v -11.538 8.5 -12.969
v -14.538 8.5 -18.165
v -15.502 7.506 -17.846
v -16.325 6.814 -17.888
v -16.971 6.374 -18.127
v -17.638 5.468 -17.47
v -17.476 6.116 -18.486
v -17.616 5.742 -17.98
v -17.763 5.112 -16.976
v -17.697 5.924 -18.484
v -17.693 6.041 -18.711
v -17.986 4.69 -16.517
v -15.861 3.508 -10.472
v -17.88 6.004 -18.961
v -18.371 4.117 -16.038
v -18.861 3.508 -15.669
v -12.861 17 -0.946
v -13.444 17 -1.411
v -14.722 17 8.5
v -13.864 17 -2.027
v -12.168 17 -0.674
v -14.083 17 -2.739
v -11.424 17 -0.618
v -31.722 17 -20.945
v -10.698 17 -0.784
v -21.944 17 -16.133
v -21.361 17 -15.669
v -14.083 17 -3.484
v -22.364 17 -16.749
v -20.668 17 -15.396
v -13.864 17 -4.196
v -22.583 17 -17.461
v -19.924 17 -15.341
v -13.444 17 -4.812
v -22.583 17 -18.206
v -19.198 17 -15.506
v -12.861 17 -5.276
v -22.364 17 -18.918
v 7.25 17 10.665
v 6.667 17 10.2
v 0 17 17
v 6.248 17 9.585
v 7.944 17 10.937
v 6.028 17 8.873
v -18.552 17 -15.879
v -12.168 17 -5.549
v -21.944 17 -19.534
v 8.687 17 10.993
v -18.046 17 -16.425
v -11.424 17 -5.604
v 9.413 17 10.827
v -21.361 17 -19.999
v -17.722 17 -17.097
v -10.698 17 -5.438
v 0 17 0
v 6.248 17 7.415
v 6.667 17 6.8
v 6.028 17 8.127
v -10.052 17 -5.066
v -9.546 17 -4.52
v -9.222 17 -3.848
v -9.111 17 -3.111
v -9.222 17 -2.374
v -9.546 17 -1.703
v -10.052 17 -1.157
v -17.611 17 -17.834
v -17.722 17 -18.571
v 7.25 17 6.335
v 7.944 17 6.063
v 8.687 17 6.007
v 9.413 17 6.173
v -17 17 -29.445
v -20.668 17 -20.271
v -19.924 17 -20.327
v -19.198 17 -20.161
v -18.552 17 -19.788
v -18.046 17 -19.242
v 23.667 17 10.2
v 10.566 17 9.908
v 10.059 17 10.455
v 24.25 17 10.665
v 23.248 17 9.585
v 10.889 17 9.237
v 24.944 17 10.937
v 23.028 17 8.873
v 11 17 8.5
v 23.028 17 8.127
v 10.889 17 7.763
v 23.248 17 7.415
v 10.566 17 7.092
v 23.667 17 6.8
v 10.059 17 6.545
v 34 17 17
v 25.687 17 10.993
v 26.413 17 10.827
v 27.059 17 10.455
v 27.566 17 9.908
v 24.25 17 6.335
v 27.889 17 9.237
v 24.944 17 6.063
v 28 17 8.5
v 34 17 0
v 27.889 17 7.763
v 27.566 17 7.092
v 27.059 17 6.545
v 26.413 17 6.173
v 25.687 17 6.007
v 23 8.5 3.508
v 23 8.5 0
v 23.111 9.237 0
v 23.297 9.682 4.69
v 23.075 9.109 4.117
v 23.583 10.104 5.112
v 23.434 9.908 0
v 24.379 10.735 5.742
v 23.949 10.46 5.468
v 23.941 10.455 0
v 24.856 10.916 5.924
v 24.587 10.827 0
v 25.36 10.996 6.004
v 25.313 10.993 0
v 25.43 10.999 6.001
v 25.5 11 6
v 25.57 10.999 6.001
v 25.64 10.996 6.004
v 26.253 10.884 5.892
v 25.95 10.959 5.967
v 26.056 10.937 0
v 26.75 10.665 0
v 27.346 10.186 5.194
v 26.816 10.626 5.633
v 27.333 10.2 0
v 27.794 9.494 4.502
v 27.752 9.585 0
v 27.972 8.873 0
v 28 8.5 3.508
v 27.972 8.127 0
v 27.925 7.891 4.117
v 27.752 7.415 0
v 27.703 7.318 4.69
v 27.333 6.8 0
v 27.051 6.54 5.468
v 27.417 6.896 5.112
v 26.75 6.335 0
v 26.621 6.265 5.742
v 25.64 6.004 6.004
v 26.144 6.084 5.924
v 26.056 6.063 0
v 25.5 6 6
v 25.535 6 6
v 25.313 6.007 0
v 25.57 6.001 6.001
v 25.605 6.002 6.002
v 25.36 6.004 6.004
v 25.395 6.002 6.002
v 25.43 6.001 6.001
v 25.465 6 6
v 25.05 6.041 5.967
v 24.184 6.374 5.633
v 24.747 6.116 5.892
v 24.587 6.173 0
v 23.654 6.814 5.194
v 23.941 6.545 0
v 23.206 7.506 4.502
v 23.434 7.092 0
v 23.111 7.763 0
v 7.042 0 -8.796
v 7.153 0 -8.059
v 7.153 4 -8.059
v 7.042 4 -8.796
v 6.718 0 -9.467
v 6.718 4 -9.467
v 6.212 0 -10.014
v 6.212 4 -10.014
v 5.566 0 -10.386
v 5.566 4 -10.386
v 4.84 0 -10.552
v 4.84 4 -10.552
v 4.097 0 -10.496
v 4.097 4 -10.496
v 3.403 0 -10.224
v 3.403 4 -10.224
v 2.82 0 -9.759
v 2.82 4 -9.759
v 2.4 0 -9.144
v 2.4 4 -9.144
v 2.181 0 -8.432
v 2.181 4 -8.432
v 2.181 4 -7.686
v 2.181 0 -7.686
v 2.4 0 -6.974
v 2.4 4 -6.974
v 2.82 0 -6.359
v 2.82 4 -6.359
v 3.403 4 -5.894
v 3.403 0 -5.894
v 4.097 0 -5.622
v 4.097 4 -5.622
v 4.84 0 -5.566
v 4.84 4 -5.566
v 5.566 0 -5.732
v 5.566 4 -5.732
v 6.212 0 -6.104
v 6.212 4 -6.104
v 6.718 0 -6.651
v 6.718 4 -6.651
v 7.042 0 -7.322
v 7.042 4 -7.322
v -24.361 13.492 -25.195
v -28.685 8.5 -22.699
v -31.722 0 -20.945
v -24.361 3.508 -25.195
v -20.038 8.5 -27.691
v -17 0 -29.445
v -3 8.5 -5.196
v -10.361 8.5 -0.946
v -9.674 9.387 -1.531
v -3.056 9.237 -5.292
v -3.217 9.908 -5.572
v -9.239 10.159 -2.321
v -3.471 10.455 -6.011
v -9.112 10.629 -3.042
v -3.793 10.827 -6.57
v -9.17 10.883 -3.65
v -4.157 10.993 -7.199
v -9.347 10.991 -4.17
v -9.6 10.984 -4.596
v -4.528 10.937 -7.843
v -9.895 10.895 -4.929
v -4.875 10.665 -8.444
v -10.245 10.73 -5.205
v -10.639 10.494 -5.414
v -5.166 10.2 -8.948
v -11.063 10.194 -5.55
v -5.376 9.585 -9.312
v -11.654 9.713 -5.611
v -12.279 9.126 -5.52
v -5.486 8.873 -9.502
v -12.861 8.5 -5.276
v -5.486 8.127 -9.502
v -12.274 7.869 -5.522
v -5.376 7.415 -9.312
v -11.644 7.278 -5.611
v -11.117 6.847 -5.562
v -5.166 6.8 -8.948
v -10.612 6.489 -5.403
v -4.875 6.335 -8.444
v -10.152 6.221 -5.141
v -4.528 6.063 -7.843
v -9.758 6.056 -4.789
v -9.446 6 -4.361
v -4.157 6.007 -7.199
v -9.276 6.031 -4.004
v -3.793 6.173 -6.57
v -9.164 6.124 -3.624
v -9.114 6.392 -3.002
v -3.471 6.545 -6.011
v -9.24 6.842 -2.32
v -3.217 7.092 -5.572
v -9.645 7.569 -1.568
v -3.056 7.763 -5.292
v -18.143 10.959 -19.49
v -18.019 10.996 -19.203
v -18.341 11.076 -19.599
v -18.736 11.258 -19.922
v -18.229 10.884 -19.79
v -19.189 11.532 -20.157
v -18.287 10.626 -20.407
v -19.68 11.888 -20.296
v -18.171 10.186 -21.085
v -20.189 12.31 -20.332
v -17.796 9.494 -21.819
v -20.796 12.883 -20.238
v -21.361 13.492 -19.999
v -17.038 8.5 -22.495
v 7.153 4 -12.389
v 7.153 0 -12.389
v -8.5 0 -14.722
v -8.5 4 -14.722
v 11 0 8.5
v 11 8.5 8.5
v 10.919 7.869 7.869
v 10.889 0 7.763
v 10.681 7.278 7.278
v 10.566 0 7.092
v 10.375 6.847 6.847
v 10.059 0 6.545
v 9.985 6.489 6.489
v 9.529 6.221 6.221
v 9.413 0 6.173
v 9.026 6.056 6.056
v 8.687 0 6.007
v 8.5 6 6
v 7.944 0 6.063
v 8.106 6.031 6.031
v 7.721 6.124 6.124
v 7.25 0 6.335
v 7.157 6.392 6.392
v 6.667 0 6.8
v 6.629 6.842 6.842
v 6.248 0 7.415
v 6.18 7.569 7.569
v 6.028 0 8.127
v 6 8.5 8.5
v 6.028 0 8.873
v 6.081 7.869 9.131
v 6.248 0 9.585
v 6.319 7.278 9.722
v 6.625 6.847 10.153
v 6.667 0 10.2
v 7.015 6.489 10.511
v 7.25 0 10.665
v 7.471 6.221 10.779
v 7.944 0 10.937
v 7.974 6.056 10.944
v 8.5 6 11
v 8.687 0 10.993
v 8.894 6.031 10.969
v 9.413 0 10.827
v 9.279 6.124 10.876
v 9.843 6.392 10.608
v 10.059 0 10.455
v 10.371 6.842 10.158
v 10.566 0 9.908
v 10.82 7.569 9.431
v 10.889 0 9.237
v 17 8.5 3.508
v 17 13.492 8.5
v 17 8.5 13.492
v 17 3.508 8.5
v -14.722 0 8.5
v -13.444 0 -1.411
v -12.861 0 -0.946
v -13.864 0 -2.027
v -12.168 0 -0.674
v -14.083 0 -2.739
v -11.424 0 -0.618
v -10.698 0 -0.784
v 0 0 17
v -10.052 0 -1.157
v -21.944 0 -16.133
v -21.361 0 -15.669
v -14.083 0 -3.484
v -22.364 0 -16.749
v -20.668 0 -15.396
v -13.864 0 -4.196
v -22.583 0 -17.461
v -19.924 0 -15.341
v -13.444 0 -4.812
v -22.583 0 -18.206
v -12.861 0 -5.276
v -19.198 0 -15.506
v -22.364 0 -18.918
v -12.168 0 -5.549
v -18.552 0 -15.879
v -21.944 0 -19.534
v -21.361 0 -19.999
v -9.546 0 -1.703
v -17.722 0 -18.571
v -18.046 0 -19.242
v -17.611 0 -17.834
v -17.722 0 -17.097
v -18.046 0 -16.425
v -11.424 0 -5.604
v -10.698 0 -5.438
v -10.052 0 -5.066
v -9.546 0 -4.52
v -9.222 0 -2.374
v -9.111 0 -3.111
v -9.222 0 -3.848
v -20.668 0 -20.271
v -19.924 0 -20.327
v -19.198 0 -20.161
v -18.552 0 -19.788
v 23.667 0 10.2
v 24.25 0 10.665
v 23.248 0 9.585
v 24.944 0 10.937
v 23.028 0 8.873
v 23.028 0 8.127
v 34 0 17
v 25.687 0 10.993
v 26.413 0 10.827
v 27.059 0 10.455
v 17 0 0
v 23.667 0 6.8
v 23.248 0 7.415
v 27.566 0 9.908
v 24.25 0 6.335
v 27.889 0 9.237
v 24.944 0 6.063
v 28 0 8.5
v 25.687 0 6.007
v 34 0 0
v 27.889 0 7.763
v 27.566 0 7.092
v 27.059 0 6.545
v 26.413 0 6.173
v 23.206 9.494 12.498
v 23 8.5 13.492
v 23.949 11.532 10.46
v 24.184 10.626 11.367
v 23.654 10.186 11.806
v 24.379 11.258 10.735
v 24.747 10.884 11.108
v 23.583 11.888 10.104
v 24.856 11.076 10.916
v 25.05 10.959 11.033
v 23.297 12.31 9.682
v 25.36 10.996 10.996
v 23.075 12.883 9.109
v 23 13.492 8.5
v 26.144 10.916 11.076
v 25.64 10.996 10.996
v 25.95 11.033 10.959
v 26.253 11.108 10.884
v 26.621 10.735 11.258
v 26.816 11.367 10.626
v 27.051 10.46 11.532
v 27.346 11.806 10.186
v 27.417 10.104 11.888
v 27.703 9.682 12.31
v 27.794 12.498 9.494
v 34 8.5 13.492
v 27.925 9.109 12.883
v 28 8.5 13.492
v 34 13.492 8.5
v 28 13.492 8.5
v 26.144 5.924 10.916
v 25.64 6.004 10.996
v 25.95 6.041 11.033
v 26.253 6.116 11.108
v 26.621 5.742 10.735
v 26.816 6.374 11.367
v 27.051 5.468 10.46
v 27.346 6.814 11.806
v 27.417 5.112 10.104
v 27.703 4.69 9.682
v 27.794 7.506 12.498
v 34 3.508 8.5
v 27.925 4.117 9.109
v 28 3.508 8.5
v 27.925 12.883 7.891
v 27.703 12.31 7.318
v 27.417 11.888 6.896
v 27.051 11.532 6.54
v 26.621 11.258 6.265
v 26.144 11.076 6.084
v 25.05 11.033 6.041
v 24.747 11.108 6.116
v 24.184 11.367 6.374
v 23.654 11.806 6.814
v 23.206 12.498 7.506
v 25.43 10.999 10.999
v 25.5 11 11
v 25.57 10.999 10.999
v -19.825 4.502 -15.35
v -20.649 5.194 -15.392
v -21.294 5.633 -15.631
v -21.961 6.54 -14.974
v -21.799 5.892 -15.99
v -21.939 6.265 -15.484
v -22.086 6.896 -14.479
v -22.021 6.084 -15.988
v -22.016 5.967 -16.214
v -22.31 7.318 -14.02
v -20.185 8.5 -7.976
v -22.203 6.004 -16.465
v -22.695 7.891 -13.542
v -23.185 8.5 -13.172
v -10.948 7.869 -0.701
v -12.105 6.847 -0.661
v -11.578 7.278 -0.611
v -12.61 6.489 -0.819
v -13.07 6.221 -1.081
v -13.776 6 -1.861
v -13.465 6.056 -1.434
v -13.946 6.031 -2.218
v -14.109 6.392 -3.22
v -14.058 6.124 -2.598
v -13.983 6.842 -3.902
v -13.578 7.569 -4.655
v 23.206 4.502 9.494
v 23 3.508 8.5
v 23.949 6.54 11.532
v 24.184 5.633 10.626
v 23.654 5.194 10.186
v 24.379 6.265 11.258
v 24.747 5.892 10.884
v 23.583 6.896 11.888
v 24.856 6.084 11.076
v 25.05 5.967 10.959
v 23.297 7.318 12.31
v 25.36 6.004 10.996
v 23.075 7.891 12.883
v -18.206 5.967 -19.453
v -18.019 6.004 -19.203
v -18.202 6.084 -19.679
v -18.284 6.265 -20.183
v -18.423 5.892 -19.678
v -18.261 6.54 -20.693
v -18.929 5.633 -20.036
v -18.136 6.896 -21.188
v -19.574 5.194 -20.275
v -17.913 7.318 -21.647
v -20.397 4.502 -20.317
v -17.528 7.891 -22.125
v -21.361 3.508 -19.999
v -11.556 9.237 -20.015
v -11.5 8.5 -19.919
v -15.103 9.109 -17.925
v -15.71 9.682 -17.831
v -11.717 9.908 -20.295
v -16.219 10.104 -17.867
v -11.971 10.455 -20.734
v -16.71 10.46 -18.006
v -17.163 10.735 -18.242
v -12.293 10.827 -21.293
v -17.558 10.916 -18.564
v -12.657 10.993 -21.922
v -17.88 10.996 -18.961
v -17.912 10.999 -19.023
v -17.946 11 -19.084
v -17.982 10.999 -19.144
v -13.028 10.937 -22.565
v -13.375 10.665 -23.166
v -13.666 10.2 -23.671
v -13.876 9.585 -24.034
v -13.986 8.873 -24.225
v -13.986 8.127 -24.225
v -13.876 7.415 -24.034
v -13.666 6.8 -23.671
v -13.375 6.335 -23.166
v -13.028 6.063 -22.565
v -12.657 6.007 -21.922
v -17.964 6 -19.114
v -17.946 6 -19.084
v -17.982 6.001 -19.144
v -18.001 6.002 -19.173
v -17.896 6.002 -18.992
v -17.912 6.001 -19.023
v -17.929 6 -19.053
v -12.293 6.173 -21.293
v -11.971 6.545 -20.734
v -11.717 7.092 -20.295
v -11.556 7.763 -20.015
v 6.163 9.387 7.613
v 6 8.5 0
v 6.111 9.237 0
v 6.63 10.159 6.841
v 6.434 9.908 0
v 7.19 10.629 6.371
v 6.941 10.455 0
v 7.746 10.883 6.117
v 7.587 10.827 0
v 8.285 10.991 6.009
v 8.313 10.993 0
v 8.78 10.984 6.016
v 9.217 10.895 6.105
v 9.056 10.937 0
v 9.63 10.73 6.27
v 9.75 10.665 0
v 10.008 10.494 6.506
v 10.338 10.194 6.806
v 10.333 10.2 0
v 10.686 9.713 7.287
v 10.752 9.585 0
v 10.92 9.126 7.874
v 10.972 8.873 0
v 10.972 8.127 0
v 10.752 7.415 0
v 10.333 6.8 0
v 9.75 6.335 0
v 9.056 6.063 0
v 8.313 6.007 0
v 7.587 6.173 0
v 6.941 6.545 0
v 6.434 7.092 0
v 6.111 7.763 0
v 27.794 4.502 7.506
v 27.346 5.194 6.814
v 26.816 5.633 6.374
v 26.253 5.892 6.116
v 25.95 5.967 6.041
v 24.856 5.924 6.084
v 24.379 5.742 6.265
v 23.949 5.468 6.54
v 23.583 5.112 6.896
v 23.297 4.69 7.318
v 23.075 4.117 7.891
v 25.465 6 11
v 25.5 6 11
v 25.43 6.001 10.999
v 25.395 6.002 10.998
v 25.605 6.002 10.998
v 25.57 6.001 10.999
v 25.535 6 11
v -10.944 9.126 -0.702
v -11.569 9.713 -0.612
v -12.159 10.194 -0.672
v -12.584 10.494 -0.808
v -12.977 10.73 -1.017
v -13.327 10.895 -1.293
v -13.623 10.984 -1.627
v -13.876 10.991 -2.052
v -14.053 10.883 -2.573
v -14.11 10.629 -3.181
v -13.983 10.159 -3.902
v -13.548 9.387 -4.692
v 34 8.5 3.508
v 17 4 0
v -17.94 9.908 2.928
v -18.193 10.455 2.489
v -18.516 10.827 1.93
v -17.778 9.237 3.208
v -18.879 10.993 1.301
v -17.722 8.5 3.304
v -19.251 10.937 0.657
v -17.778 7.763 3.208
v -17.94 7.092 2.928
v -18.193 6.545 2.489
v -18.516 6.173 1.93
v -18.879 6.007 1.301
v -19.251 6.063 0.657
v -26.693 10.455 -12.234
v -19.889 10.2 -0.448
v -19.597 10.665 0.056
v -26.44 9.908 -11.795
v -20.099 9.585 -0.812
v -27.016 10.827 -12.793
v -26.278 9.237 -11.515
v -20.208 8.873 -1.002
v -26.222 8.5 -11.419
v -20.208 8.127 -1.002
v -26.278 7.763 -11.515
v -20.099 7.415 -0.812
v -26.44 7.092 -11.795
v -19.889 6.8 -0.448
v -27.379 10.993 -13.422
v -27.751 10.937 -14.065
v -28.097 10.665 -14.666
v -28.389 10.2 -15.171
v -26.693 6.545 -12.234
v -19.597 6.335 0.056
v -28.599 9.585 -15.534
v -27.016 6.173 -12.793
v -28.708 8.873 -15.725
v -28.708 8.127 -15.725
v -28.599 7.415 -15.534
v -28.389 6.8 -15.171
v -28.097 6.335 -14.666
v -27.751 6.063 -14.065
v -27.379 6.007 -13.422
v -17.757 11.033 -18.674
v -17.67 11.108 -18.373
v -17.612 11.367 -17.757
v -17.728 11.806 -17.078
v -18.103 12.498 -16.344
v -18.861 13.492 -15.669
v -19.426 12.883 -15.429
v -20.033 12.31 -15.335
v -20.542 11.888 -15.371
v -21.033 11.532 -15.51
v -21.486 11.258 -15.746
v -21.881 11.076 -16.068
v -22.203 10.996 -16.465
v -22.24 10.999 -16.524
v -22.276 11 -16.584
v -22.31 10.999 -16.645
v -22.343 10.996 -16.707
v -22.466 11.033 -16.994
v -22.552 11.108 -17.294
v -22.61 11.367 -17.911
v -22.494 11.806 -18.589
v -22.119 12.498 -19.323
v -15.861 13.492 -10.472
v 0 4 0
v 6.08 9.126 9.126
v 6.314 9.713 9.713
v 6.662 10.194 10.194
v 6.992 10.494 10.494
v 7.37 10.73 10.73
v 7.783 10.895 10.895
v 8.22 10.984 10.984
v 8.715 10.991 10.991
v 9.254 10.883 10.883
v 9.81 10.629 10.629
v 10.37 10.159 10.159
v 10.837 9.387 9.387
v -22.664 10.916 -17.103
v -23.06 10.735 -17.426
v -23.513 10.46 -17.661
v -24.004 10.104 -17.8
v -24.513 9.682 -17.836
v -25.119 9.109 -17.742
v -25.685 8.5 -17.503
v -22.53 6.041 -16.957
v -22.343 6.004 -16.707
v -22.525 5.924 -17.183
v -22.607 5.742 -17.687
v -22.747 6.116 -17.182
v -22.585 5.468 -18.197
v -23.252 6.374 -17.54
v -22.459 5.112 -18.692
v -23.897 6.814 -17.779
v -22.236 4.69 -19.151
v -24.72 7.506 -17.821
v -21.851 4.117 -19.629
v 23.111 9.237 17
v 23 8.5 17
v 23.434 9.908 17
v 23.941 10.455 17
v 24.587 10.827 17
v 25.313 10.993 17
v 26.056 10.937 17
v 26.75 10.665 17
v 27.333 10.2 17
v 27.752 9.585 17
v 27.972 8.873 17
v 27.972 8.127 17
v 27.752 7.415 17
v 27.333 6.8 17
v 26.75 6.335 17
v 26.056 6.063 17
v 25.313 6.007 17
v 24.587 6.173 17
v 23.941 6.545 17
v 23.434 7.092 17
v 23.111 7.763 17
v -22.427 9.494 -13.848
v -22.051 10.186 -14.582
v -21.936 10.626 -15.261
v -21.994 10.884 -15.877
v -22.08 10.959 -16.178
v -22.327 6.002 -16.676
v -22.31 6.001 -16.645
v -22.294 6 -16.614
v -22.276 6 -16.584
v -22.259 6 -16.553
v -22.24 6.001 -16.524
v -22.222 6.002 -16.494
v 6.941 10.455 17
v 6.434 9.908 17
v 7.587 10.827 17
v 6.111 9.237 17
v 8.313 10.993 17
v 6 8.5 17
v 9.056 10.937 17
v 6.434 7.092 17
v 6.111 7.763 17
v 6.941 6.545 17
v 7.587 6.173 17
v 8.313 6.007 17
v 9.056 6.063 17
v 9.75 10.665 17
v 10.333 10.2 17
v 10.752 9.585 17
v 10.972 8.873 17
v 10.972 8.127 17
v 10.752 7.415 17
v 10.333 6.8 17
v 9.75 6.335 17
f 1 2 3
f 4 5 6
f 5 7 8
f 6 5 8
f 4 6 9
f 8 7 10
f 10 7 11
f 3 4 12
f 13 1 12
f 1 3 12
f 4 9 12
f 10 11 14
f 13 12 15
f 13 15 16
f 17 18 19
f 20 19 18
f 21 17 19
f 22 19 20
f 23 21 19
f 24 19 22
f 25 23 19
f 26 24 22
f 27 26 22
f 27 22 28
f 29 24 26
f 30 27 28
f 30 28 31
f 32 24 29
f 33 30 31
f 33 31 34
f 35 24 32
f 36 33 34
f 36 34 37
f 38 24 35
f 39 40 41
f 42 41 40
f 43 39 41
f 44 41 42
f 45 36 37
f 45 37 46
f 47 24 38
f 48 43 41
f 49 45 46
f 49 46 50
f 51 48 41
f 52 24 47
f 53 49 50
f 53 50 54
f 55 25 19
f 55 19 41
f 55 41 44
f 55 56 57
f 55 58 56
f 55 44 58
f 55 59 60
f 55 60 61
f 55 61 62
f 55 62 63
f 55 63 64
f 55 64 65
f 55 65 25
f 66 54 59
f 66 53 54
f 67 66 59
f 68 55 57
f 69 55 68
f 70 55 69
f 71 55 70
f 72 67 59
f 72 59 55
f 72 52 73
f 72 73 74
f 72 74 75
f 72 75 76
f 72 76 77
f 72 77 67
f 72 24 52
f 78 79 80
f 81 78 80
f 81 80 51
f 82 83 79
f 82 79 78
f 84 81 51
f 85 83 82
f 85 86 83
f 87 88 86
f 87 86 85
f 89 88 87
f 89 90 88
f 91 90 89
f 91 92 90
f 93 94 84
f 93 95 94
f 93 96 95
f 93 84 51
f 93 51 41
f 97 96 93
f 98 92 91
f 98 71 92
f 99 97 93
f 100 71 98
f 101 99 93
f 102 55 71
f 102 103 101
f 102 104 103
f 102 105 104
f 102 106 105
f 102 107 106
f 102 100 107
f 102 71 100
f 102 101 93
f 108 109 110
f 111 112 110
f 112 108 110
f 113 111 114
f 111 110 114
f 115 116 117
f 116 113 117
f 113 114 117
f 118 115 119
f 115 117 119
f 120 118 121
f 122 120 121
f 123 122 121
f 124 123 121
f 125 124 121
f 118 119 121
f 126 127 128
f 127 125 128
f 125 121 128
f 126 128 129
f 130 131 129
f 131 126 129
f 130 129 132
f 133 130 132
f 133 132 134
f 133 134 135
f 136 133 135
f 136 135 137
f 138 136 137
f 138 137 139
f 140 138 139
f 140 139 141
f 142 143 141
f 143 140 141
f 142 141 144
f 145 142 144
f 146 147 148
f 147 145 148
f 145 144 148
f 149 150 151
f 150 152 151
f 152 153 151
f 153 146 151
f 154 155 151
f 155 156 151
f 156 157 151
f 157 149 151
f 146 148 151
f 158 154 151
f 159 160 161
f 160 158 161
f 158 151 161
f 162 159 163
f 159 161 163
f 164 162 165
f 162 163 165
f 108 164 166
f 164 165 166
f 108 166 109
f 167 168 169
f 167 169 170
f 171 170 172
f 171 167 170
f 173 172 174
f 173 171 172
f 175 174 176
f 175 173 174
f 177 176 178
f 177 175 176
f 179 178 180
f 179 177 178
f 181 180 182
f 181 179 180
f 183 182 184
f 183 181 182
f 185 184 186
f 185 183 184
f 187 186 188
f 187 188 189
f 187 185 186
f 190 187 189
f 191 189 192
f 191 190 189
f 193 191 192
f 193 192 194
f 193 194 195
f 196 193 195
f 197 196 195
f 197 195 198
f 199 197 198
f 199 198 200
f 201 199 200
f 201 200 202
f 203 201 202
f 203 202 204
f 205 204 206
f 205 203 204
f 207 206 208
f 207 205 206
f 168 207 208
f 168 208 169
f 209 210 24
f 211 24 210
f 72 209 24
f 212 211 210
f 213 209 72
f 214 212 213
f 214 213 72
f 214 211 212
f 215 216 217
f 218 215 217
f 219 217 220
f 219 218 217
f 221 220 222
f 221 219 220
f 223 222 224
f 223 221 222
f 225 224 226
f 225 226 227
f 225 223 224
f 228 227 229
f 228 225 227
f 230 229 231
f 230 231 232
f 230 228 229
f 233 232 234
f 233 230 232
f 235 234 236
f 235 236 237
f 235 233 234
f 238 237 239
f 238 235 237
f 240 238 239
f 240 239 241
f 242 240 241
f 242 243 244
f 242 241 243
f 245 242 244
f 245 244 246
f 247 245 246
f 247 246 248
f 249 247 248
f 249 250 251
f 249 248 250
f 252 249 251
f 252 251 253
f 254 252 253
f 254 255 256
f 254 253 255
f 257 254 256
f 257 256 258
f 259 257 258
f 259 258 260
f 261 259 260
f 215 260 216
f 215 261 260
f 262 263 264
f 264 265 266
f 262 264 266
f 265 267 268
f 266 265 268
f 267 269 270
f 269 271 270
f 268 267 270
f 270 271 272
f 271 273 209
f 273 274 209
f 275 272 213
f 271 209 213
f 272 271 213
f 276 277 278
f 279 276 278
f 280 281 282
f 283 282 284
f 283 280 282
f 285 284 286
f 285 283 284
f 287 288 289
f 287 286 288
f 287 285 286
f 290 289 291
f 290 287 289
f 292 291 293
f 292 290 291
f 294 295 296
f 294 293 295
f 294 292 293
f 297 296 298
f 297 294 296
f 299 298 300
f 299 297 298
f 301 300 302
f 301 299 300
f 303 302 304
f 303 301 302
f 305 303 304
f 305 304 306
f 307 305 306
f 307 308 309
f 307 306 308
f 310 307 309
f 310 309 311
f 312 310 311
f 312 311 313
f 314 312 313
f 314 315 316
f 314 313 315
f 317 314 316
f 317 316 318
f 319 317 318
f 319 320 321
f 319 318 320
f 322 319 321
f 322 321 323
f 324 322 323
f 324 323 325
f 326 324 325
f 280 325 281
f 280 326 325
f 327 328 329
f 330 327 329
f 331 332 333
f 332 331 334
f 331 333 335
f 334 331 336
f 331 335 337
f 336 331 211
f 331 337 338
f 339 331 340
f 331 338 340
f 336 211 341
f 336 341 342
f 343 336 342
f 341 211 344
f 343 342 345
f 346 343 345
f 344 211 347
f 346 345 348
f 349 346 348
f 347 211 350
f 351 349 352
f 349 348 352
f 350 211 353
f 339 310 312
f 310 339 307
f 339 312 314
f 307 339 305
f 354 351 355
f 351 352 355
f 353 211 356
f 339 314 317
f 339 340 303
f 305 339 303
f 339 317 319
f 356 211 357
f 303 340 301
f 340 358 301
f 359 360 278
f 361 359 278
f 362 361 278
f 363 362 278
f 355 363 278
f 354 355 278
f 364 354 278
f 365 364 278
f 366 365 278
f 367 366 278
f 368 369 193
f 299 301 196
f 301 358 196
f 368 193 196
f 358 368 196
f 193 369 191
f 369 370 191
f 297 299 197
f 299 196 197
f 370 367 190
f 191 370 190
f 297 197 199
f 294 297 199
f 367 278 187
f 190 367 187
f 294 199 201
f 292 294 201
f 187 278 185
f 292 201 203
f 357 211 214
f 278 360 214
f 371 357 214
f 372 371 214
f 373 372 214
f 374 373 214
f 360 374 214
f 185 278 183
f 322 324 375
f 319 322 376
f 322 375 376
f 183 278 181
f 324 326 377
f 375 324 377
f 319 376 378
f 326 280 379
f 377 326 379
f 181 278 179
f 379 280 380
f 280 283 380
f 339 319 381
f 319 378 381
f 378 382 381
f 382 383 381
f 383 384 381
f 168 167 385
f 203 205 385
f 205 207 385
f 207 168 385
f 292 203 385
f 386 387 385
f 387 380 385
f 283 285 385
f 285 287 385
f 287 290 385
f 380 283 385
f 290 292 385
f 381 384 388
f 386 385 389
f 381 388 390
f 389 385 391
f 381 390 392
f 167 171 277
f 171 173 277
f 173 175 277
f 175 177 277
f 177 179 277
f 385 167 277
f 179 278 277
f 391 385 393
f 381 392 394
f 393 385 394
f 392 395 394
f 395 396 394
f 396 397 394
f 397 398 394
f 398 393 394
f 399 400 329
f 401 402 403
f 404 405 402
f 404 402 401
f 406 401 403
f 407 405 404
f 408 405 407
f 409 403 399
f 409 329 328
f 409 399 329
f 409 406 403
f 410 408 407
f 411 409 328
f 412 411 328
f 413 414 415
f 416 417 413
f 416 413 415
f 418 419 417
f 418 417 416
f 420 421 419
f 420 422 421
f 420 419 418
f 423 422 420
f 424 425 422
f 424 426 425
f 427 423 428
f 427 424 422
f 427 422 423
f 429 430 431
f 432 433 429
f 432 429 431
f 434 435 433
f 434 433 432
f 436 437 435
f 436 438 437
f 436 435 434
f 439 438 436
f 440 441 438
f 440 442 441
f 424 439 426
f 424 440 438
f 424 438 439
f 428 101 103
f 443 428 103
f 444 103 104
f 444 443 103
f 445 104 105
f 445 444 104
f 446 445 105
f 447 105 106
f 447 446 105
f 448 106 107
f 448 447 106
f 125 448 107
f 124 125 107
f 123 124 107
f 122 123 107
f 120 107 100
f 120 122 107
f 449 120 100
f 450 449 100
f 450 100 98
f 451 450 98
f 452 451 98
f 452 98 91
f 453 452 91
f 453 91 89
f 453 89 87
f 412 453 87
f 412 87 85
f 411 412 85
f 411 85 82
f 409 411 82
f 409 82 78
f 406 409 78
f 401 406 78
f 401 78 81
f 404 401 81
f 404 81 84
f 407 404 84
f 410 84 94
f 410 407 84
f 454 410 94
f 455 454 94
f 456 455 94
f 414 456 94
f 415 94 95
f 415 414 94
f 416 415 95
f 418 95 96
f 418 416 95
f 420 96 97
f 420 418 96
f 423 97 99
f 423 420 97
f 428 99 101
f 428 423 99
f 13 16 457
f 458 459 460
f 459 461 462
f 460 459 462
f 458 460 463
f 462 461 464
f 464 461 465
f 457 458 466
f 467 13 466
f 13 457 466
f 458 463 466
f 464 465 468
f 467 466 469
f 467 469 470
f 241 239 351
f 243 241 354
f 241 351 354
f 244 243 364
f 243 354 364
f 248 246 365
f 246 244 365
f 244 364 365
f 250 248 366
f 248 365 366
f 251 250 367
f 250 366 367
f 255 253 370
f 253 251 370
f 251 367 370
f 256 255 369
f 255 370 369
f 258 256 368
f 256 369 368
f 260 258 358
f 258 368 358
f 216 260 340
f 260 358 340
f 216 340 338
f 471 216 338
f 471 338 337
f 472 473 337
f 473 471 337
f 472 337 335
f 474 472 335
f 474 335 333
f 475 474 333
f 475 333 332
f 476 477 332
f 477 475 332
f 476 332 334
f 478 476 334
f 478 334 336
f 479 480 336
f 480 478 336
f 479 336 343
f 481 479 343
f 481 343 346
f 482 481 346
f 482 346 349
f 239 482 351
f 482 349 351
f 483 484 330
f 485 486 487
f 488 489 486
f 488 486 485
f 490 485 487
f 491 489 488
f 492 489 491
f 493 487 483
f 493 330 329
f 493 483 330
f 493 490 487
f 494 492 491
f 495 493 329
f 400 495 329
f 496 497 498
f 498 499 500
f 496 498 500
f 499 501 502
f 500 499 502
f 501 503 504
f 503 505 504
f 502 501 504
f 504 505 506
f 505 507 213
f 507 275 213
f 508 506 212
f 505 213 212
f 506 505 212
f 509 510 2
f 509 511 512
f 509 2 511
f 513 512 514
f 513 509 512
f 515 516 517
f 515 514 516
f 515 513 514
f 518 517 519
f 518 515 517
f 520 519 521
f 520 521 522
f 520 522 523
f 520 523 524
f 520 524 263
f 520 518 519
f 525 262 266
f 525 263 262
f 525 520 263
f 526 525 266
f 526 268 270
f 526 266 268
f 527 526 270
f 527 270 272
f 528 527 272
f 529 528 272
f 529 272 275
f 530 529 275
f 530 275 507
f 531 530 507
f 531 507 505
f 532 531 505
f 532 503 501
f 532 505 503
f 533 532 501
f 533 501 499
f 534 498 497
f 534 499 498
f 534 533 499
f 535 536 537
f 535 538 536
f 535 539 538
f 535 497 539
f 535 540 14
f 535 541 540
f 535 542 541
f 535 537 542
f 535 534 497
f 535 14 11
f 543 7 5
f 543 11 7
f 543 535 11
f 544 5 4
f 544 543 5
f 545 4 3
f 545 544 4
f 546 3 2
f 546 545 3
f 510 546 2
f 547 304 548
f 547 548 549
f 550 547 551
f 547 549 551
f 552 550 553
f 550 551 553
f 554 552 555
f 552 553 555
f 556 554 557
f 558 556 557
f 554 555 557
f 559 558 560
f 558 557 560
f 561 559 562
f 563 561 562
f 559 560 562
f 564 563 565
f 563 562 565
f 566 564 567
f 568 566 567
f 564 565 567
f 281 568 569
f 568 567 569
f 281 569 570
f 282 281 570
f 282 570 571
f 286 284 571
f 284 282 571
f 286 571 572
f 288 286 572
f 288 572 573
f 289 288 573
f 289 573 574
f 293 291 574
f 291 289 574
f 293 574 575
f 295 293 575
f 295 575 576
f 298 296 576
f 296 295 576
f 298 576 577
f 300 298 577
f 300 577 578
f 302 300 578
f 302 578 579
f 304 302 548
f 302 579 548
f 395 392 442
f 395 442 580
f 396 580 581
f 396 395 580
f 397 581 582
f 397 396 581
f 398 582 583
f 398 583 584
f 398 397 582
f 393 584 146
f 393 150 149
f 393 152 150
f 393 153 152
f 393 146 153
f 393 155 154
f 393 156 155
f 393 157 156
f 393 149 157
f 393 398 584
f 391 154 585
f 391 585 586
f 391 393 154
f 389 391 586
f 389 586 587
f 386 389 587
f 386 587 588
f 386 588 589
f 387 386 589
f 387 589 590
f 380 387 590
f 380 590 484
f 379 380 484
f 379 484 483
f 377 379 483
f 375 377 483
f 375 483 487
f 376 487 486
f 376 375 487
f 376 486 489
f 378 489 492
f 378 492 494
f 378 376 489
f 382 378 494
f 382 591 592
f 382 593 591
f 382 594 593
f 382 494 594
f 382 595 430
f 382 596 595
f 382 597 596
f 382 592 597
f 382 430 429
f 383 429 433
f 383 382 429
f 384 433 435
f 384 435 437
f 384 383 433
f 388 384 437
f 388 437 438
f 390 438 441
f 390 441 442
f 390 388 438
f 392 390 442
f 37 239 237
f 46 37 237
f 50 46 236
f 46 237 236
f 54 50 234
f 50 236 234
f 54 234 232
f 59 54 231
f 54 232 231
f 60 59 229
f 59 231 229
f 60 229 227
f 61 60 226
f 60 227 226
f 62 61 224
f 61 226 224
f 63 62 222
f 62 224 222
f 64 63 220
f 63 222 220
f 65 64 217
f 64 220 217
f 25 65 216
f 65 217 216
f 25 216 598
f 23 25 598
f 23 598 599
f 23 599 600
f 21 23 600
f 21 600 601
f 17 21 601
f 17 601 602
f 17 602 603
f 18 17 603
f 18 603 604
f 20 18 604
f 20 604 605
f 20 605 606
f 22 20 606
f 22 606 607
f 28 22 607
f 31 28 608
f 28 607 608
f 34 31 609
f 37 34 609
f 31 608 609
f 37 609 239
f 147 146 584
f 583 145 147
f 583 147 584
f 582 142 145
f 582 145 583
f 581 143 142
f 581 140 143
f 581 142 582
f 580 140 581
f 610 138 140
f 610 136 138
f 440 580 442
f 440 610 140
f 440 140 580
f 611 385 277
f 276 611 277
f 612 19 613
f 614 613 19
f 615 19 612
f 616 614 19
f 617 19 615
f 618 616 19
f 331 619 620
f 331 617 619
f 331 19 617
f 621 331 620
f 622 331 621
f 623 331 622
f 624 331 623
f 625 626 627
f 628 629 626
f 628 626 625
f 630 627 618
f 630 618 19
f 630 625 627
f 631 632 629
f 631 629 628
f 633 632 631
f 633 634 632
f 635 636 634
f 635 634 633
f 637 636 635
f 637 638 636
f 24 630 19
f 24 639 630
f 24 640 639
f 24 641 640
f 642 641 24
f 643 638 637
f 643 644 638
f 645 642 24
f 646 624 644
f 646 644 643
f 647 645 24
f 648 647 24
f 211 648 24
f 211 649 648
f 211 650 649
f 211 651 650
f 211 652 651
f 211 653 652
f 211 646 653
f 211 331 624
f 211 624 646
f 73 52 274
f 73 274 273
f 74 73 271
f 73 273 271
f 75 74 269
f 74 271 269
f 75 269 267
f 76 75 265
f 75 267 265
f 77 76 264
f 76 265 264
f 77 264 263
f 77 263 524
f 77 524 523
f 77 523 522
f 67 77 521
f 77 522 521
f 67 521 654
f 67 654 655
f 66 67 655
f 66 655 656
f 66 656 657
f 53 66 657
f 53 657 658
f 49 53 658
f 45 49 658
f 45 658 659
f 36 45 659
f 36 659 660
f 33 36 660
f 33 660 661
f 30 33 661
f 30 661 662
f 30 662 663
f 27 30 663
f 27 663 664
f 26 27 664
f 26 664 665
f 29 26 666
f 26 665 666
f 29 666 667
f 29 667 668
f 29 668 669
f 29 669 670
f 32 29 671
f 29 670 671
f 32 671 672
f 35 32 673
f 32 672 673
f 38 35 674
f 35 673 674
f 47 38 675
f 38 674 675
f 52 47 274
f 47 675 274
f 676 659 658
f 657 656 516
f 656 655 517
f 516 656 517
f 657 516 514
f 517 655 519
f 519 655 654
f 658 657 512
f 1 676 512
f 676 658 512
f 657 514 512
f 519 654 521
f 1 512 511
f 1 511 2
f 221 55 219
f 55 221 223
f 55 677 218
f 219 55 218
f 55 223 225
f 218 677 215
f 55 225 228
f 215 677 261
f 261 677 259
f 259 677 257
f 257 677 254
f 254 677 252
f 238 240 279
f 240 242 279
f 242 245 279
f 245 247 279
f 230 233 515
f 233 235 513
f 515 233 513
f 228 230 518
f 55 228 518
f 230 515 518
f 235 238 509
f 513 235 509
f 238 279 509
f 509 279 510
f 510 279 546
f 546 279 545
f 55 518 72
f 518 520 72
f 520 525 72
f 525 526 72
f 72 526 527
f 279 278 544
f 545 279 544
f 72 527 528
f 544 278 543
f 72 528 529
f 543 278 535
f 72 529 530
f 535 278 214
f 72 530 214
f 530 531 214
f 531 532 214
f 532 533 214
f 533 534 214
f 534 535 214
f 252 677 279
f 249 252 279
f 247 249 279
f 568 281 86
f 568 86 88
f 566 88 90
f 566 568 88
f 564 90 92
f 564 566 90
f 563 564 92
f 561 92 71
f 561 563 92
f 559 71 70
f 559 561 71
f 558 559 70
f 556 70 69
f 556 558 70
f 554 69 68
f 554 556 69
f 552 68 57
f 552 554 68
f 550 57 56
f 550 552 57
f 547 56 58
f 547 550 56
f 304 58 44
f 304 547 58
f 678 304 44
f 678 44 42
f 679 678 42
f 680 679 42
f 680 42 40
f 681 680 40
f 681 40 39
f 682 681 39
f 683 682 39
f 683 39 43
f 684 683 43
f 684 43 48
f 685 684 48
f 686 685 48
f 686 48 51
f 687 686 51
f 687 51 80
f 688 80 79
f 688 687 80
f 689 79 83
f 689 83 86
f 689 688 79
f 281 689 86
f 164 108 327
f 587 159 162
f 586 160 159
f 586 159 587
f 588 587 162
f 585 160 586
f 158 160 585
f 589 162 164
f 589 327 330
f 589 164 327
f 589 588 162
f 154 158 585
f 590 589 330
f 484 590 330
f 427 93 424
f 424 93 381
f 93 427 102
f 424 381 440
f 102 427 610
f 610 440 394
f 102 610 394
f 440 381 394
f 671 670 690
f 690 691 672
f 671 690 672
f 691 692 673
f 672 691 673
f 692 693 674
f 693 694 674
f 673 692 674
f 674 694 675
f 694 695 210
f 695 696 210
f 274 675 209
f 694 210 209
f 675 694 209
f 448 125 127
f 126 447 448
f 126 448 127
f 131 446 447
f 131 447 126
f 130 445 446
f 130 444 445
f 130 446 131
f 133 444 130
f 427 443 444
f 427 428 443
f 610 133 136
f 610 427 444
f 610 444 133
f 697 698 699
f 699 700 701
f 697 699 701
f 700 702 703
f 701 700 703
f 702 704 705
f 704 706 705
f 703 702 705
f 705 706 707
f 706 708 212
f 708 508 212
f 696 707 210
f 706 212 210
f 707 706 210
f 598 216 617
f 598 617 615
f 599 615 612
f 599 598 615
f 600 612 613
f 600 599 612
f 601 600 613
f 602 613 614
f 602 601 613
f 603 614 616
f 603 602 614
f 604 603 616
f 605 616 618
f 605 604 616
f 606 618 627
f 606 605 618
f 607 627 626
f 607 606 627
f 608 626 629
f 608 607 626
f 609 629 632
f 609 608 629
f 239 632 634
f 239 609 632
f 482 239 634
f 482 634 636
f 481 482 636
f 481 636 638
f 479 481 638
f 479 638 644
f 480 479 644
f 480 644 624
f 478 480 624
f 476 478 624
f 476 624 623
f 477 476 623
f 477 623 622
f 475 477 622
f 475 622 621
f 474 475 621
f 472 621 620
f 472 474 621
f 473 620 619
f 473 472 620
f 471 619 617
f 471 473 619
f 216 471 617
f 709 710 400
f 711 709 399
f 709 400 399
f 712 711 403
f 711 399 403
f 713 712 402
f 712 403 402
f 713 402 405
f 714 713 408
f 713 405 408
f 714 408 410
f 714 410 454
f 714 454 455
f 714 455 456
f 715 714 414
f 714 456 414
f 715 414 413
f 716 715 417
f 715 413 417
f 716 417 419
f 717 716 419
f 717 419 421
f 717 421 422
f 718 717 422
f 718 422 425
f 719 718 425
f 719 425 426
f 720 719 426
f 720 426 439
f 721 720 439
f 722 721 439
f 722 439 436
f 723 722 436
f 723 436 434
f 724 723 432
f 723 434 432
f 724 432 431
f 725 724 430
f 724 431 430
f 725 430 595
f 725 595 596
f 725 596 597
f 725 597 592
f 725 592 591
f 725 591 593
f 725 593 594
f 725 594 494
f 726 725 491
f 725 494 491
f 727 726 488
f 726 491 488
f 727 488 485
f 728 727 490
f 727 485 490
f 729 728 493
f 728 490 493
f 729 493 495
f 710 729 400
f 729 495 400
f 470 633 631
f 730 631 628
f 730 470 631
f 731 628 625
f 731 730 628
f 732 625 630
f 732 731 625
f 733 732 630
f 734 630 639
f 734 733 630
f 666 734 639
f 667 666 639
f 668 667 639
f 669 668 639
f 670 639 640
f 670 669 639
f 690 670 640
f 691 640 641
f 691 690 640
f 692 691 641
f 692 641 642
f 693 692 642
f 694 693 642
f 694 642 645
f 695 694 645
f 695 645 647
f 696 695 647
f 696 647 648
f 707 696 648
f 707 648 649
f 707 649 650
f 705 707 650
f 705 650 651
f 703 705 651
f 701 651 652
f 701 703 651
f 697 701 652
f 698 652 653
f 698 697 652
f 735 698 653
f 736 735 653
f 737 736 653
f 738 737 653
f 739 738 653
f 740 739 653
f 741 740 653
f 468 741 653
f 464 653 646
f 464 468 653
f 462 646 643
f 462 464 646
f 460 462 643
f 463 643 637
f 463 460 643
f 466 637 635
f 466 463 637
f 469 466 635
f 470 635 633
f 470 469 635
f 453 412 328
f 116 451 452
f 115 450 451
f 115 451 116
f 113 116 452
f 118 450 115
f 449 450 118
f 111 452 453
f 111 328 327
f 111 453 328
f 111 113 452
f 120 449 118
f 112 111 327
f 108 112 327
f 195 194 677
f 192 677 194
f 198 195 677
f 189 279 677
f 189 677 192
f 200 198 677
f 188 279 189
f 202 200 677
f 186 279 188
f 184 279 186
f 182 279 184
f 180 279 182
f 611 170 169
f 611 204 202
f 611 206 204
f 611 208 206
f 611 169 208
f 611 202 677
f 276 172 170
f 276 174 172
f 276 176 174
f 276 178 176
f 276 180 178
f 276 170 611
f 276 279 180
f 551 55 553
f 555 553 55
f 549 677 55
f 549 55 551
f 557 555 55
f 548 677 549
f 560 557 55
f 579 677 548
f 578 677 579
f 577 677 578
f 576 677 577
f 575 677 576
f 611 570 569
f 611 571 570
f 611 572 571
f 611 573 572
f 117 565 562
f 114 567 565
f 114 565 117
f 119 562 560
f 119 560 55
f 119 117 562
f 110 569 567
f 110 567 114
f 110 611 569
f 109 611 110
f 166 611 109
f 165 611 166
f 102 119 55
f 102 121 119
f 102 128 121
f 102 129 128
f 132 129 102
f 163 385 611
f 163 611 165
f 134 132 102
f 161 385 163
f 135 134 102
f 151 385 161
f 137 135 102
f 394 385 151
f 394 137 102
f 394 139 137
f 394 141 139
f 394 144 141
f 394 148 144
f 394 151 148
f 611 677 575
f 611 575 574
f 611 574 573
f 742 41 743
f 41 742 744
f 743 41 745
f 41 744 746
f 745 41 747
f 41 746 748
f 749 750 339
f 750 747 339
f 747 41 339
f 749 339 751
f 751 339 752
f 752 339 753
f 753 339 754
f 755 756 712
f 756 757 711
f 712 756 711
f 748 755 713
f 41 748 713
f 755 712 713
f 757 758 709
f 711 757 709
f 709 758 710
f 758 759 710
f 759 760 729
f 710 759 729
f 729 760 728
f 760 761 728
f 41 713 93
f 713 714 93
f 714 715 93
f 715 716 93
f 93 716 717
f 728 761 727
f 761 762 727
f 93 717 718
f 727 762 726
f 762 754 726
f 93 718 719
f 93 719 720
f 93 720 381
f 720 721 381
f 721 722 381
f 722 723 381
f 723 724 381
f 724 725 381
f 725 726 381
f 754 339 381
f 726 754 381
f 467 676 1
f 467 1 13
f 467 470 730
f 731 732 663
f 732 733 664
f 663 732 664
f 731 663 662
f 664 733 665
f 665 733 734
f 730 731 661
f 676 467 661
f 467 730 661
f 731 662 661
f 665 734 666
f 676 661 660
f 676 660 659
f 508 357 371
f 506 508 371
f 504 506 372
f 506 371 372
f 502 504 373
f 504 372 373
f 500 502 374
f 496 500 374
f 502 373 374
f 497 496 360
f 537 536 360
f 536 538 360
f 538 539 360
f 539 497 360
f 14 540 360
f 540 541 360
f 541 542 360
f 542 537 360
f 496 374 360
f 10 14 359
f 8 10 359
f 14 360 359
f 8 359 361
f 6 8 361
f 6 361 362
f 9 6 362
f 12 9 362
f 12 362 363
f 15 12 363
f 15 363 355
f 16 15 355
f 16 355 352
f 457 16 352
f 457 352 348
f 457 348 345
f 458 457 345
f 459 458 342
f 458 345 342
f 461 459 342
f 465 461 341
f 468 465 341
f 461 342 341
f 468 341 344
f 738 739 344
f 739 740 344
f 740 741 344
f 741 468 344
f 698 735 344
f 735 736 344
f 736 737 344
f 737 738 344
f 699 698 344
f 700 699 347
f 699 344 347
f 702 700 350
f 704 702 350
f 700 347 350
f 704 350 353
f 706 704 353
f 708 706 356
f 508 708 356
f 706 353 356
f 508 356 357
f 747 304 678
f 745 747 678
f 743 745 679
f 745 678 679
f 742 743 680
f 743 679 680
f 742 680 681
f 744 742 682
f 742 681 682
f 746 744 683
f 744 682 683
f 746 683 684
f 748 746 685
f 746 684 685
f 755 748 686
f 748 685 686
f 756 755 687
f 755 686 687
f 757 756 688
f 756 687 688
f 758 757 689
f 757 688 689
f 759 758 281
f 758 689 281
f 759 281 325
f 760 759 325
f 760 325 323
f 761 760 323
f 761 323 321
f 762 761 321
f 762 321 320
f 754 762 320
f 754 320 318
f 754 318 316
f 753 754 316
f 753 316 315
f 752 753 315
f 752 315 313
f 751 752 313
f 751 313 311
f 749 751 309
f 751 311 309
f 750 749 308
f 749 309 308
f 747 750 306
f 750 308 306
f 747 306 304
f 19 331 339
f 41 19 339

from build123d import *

# Parameters (mm, degrees)
SKETCH1_W           = 34
SKETCH1_H           = 17
SKETCH1_R           = 2.5
BOSS_EXTRUDE1_DEPTH = 17
SKETCH6_OUTSIDE_W   = 44.328
SKETCH6_OUTSIDE_H   = 27.328
SKETCH6_OUTSIDE_W_2 = 34
SKETCH6_OUTSIDE_H_2 = 17
SKETCH6_OUTSIDE_R   = 2.5
CUT_EXTRUDE10_DEPTH = 18
SKETCH7_OUTSIDE_W   = 27.328
SKETCH7_OUTSIDE_H   = 27.328
SKETCH7_OUTSIDE_W_2 = 17
SKETCH7_OUTSIDE_H_2 = 17
CUT_EXTRUDE11_DEPTH = 17
BOSS_EXTRUDE2_DEPTH = 17
SKETCH13_R          = 2.5
BOSS_EXTRUDE3_DEPTH = 4


with BuildPart() as part:
    # sketch1 → Boss-Extrude1 (new body)
    with BuildSketch(Plane(origin=(0, 0, 0), x_dir=(1, 0, 0), z_dir=(0, 1, 0))):
        with Locations((17, -8.5)):
            Rectangle(SKETCH1_W, SKETCH1_H)
        with Locations((8.5, -8.5)):
            Circle(SKETCH1_R, mode=Mode.SUBTRACT)
        with Locations((25.5, -8.5)):
            Circle(SKETCH1_R, mode=Mode.SUBTRACT)
    extrude(amount=BOSS_EXTRUDE1_DEPTH)

    # Sketch6 outside → Cut-Extrude10 (cut, through all)
    with BuildSketch(Plane(origin=(0, 0, 0), x_dir=(-1, 0, 0), z_dir=(0, 0, -1))):
        with Locations((-17, 8.5)):
            Rectangle(SKETCH6_OUTSIDE_W, SKETCH6_OUTSIDE_H)
        with Locations((-17, 8.5)):
            Rectangle(SKETCH6_OUTSIDE_W_2, SKETCH6_OUTSIDE_H_2, mode=Mode.SUBTRACT)
        with Locations((-25.5, 8.5)):
            Circle(SKETCH6_OUTSIDE_R)
        with Locations((-8.5, 8.5)):
            Circle(SKETCH6_OUTSIDE_R)
    extrude(amount=-CUT_EXTRUDE10_DEPTH, mode=Mode.SUBTRACT)

    # Sketch7 outside → Cut-Extrude11 (cut)
    with BuildSketch(Plane(origin=(34, 0, 0), x_dir=(0, 0, -1), z_dir=(1, 0, 0))):
        with Locations((-8.5, 8.5)):
            Rectangle(SKETCH7_OUTSIDE_W, SKETCH7_OUTSIDE_H)
        with Locations((-8.5, 8.5)):
            Rectangle(SKETCH7_OUTSIDE_W_2, SKETCH7_OUTSIDE_H_2, mode=Mode.SUBTRACT)
        Polygon((-8.5, 13.492173875), (-3.507826125, 8.5), (-8.5, 3.507826125), (-13.492173875, 8.5), align=None)
    extrude(amount=-CUT_EXTRUDE11_DEPTH, mode=Mode.SUBTRACT)


with BuildPart() as body_2:
    # Mirror6: mirrored copy
    add(part.part.mirror(Plane(origin=(0, 0, 0), x_dir=(-0.5, 0, 0.866025404), z_dir=(-0.866025404, 0, -0.5))))


with BuildPart() as part_1:
    add(part.part)

    add(body_2.part)  # Boss-Extrude2 merges body 2
    # Sketch11 → Boss-Extrude2 (add)
    with BuildSketch(Plane(origin=(0, 0, 0), x_dir=(1, 0, 0), z_dir=(0, 1, 0))):
        Polygon((-14.722431864, -8.5), (0, -17), (0, 0), align=None)
    extrude(amount=BOSS_EXTRUDE2_DEPTH)

    # Sketch13 → Boss-Extrude3 (add)
    with BuildSketch(Plane(origin=(0, 0, 0), x_dir=(1, 0, 0), z_dir=(0, 1, 0))):
        Polygon((7.152847248, 12.389094852), (-8.5, 14.722431864), (0, 0), (17, 0), align=None)
        with Locations((4.652847248, 8.058967833)):
            Circle(SKETCH13_R, mode=Mode.SUBTRACT)
    extrude(amount=BOSS_EXTRUDE3_DEPTH)


solid = part_1.part
